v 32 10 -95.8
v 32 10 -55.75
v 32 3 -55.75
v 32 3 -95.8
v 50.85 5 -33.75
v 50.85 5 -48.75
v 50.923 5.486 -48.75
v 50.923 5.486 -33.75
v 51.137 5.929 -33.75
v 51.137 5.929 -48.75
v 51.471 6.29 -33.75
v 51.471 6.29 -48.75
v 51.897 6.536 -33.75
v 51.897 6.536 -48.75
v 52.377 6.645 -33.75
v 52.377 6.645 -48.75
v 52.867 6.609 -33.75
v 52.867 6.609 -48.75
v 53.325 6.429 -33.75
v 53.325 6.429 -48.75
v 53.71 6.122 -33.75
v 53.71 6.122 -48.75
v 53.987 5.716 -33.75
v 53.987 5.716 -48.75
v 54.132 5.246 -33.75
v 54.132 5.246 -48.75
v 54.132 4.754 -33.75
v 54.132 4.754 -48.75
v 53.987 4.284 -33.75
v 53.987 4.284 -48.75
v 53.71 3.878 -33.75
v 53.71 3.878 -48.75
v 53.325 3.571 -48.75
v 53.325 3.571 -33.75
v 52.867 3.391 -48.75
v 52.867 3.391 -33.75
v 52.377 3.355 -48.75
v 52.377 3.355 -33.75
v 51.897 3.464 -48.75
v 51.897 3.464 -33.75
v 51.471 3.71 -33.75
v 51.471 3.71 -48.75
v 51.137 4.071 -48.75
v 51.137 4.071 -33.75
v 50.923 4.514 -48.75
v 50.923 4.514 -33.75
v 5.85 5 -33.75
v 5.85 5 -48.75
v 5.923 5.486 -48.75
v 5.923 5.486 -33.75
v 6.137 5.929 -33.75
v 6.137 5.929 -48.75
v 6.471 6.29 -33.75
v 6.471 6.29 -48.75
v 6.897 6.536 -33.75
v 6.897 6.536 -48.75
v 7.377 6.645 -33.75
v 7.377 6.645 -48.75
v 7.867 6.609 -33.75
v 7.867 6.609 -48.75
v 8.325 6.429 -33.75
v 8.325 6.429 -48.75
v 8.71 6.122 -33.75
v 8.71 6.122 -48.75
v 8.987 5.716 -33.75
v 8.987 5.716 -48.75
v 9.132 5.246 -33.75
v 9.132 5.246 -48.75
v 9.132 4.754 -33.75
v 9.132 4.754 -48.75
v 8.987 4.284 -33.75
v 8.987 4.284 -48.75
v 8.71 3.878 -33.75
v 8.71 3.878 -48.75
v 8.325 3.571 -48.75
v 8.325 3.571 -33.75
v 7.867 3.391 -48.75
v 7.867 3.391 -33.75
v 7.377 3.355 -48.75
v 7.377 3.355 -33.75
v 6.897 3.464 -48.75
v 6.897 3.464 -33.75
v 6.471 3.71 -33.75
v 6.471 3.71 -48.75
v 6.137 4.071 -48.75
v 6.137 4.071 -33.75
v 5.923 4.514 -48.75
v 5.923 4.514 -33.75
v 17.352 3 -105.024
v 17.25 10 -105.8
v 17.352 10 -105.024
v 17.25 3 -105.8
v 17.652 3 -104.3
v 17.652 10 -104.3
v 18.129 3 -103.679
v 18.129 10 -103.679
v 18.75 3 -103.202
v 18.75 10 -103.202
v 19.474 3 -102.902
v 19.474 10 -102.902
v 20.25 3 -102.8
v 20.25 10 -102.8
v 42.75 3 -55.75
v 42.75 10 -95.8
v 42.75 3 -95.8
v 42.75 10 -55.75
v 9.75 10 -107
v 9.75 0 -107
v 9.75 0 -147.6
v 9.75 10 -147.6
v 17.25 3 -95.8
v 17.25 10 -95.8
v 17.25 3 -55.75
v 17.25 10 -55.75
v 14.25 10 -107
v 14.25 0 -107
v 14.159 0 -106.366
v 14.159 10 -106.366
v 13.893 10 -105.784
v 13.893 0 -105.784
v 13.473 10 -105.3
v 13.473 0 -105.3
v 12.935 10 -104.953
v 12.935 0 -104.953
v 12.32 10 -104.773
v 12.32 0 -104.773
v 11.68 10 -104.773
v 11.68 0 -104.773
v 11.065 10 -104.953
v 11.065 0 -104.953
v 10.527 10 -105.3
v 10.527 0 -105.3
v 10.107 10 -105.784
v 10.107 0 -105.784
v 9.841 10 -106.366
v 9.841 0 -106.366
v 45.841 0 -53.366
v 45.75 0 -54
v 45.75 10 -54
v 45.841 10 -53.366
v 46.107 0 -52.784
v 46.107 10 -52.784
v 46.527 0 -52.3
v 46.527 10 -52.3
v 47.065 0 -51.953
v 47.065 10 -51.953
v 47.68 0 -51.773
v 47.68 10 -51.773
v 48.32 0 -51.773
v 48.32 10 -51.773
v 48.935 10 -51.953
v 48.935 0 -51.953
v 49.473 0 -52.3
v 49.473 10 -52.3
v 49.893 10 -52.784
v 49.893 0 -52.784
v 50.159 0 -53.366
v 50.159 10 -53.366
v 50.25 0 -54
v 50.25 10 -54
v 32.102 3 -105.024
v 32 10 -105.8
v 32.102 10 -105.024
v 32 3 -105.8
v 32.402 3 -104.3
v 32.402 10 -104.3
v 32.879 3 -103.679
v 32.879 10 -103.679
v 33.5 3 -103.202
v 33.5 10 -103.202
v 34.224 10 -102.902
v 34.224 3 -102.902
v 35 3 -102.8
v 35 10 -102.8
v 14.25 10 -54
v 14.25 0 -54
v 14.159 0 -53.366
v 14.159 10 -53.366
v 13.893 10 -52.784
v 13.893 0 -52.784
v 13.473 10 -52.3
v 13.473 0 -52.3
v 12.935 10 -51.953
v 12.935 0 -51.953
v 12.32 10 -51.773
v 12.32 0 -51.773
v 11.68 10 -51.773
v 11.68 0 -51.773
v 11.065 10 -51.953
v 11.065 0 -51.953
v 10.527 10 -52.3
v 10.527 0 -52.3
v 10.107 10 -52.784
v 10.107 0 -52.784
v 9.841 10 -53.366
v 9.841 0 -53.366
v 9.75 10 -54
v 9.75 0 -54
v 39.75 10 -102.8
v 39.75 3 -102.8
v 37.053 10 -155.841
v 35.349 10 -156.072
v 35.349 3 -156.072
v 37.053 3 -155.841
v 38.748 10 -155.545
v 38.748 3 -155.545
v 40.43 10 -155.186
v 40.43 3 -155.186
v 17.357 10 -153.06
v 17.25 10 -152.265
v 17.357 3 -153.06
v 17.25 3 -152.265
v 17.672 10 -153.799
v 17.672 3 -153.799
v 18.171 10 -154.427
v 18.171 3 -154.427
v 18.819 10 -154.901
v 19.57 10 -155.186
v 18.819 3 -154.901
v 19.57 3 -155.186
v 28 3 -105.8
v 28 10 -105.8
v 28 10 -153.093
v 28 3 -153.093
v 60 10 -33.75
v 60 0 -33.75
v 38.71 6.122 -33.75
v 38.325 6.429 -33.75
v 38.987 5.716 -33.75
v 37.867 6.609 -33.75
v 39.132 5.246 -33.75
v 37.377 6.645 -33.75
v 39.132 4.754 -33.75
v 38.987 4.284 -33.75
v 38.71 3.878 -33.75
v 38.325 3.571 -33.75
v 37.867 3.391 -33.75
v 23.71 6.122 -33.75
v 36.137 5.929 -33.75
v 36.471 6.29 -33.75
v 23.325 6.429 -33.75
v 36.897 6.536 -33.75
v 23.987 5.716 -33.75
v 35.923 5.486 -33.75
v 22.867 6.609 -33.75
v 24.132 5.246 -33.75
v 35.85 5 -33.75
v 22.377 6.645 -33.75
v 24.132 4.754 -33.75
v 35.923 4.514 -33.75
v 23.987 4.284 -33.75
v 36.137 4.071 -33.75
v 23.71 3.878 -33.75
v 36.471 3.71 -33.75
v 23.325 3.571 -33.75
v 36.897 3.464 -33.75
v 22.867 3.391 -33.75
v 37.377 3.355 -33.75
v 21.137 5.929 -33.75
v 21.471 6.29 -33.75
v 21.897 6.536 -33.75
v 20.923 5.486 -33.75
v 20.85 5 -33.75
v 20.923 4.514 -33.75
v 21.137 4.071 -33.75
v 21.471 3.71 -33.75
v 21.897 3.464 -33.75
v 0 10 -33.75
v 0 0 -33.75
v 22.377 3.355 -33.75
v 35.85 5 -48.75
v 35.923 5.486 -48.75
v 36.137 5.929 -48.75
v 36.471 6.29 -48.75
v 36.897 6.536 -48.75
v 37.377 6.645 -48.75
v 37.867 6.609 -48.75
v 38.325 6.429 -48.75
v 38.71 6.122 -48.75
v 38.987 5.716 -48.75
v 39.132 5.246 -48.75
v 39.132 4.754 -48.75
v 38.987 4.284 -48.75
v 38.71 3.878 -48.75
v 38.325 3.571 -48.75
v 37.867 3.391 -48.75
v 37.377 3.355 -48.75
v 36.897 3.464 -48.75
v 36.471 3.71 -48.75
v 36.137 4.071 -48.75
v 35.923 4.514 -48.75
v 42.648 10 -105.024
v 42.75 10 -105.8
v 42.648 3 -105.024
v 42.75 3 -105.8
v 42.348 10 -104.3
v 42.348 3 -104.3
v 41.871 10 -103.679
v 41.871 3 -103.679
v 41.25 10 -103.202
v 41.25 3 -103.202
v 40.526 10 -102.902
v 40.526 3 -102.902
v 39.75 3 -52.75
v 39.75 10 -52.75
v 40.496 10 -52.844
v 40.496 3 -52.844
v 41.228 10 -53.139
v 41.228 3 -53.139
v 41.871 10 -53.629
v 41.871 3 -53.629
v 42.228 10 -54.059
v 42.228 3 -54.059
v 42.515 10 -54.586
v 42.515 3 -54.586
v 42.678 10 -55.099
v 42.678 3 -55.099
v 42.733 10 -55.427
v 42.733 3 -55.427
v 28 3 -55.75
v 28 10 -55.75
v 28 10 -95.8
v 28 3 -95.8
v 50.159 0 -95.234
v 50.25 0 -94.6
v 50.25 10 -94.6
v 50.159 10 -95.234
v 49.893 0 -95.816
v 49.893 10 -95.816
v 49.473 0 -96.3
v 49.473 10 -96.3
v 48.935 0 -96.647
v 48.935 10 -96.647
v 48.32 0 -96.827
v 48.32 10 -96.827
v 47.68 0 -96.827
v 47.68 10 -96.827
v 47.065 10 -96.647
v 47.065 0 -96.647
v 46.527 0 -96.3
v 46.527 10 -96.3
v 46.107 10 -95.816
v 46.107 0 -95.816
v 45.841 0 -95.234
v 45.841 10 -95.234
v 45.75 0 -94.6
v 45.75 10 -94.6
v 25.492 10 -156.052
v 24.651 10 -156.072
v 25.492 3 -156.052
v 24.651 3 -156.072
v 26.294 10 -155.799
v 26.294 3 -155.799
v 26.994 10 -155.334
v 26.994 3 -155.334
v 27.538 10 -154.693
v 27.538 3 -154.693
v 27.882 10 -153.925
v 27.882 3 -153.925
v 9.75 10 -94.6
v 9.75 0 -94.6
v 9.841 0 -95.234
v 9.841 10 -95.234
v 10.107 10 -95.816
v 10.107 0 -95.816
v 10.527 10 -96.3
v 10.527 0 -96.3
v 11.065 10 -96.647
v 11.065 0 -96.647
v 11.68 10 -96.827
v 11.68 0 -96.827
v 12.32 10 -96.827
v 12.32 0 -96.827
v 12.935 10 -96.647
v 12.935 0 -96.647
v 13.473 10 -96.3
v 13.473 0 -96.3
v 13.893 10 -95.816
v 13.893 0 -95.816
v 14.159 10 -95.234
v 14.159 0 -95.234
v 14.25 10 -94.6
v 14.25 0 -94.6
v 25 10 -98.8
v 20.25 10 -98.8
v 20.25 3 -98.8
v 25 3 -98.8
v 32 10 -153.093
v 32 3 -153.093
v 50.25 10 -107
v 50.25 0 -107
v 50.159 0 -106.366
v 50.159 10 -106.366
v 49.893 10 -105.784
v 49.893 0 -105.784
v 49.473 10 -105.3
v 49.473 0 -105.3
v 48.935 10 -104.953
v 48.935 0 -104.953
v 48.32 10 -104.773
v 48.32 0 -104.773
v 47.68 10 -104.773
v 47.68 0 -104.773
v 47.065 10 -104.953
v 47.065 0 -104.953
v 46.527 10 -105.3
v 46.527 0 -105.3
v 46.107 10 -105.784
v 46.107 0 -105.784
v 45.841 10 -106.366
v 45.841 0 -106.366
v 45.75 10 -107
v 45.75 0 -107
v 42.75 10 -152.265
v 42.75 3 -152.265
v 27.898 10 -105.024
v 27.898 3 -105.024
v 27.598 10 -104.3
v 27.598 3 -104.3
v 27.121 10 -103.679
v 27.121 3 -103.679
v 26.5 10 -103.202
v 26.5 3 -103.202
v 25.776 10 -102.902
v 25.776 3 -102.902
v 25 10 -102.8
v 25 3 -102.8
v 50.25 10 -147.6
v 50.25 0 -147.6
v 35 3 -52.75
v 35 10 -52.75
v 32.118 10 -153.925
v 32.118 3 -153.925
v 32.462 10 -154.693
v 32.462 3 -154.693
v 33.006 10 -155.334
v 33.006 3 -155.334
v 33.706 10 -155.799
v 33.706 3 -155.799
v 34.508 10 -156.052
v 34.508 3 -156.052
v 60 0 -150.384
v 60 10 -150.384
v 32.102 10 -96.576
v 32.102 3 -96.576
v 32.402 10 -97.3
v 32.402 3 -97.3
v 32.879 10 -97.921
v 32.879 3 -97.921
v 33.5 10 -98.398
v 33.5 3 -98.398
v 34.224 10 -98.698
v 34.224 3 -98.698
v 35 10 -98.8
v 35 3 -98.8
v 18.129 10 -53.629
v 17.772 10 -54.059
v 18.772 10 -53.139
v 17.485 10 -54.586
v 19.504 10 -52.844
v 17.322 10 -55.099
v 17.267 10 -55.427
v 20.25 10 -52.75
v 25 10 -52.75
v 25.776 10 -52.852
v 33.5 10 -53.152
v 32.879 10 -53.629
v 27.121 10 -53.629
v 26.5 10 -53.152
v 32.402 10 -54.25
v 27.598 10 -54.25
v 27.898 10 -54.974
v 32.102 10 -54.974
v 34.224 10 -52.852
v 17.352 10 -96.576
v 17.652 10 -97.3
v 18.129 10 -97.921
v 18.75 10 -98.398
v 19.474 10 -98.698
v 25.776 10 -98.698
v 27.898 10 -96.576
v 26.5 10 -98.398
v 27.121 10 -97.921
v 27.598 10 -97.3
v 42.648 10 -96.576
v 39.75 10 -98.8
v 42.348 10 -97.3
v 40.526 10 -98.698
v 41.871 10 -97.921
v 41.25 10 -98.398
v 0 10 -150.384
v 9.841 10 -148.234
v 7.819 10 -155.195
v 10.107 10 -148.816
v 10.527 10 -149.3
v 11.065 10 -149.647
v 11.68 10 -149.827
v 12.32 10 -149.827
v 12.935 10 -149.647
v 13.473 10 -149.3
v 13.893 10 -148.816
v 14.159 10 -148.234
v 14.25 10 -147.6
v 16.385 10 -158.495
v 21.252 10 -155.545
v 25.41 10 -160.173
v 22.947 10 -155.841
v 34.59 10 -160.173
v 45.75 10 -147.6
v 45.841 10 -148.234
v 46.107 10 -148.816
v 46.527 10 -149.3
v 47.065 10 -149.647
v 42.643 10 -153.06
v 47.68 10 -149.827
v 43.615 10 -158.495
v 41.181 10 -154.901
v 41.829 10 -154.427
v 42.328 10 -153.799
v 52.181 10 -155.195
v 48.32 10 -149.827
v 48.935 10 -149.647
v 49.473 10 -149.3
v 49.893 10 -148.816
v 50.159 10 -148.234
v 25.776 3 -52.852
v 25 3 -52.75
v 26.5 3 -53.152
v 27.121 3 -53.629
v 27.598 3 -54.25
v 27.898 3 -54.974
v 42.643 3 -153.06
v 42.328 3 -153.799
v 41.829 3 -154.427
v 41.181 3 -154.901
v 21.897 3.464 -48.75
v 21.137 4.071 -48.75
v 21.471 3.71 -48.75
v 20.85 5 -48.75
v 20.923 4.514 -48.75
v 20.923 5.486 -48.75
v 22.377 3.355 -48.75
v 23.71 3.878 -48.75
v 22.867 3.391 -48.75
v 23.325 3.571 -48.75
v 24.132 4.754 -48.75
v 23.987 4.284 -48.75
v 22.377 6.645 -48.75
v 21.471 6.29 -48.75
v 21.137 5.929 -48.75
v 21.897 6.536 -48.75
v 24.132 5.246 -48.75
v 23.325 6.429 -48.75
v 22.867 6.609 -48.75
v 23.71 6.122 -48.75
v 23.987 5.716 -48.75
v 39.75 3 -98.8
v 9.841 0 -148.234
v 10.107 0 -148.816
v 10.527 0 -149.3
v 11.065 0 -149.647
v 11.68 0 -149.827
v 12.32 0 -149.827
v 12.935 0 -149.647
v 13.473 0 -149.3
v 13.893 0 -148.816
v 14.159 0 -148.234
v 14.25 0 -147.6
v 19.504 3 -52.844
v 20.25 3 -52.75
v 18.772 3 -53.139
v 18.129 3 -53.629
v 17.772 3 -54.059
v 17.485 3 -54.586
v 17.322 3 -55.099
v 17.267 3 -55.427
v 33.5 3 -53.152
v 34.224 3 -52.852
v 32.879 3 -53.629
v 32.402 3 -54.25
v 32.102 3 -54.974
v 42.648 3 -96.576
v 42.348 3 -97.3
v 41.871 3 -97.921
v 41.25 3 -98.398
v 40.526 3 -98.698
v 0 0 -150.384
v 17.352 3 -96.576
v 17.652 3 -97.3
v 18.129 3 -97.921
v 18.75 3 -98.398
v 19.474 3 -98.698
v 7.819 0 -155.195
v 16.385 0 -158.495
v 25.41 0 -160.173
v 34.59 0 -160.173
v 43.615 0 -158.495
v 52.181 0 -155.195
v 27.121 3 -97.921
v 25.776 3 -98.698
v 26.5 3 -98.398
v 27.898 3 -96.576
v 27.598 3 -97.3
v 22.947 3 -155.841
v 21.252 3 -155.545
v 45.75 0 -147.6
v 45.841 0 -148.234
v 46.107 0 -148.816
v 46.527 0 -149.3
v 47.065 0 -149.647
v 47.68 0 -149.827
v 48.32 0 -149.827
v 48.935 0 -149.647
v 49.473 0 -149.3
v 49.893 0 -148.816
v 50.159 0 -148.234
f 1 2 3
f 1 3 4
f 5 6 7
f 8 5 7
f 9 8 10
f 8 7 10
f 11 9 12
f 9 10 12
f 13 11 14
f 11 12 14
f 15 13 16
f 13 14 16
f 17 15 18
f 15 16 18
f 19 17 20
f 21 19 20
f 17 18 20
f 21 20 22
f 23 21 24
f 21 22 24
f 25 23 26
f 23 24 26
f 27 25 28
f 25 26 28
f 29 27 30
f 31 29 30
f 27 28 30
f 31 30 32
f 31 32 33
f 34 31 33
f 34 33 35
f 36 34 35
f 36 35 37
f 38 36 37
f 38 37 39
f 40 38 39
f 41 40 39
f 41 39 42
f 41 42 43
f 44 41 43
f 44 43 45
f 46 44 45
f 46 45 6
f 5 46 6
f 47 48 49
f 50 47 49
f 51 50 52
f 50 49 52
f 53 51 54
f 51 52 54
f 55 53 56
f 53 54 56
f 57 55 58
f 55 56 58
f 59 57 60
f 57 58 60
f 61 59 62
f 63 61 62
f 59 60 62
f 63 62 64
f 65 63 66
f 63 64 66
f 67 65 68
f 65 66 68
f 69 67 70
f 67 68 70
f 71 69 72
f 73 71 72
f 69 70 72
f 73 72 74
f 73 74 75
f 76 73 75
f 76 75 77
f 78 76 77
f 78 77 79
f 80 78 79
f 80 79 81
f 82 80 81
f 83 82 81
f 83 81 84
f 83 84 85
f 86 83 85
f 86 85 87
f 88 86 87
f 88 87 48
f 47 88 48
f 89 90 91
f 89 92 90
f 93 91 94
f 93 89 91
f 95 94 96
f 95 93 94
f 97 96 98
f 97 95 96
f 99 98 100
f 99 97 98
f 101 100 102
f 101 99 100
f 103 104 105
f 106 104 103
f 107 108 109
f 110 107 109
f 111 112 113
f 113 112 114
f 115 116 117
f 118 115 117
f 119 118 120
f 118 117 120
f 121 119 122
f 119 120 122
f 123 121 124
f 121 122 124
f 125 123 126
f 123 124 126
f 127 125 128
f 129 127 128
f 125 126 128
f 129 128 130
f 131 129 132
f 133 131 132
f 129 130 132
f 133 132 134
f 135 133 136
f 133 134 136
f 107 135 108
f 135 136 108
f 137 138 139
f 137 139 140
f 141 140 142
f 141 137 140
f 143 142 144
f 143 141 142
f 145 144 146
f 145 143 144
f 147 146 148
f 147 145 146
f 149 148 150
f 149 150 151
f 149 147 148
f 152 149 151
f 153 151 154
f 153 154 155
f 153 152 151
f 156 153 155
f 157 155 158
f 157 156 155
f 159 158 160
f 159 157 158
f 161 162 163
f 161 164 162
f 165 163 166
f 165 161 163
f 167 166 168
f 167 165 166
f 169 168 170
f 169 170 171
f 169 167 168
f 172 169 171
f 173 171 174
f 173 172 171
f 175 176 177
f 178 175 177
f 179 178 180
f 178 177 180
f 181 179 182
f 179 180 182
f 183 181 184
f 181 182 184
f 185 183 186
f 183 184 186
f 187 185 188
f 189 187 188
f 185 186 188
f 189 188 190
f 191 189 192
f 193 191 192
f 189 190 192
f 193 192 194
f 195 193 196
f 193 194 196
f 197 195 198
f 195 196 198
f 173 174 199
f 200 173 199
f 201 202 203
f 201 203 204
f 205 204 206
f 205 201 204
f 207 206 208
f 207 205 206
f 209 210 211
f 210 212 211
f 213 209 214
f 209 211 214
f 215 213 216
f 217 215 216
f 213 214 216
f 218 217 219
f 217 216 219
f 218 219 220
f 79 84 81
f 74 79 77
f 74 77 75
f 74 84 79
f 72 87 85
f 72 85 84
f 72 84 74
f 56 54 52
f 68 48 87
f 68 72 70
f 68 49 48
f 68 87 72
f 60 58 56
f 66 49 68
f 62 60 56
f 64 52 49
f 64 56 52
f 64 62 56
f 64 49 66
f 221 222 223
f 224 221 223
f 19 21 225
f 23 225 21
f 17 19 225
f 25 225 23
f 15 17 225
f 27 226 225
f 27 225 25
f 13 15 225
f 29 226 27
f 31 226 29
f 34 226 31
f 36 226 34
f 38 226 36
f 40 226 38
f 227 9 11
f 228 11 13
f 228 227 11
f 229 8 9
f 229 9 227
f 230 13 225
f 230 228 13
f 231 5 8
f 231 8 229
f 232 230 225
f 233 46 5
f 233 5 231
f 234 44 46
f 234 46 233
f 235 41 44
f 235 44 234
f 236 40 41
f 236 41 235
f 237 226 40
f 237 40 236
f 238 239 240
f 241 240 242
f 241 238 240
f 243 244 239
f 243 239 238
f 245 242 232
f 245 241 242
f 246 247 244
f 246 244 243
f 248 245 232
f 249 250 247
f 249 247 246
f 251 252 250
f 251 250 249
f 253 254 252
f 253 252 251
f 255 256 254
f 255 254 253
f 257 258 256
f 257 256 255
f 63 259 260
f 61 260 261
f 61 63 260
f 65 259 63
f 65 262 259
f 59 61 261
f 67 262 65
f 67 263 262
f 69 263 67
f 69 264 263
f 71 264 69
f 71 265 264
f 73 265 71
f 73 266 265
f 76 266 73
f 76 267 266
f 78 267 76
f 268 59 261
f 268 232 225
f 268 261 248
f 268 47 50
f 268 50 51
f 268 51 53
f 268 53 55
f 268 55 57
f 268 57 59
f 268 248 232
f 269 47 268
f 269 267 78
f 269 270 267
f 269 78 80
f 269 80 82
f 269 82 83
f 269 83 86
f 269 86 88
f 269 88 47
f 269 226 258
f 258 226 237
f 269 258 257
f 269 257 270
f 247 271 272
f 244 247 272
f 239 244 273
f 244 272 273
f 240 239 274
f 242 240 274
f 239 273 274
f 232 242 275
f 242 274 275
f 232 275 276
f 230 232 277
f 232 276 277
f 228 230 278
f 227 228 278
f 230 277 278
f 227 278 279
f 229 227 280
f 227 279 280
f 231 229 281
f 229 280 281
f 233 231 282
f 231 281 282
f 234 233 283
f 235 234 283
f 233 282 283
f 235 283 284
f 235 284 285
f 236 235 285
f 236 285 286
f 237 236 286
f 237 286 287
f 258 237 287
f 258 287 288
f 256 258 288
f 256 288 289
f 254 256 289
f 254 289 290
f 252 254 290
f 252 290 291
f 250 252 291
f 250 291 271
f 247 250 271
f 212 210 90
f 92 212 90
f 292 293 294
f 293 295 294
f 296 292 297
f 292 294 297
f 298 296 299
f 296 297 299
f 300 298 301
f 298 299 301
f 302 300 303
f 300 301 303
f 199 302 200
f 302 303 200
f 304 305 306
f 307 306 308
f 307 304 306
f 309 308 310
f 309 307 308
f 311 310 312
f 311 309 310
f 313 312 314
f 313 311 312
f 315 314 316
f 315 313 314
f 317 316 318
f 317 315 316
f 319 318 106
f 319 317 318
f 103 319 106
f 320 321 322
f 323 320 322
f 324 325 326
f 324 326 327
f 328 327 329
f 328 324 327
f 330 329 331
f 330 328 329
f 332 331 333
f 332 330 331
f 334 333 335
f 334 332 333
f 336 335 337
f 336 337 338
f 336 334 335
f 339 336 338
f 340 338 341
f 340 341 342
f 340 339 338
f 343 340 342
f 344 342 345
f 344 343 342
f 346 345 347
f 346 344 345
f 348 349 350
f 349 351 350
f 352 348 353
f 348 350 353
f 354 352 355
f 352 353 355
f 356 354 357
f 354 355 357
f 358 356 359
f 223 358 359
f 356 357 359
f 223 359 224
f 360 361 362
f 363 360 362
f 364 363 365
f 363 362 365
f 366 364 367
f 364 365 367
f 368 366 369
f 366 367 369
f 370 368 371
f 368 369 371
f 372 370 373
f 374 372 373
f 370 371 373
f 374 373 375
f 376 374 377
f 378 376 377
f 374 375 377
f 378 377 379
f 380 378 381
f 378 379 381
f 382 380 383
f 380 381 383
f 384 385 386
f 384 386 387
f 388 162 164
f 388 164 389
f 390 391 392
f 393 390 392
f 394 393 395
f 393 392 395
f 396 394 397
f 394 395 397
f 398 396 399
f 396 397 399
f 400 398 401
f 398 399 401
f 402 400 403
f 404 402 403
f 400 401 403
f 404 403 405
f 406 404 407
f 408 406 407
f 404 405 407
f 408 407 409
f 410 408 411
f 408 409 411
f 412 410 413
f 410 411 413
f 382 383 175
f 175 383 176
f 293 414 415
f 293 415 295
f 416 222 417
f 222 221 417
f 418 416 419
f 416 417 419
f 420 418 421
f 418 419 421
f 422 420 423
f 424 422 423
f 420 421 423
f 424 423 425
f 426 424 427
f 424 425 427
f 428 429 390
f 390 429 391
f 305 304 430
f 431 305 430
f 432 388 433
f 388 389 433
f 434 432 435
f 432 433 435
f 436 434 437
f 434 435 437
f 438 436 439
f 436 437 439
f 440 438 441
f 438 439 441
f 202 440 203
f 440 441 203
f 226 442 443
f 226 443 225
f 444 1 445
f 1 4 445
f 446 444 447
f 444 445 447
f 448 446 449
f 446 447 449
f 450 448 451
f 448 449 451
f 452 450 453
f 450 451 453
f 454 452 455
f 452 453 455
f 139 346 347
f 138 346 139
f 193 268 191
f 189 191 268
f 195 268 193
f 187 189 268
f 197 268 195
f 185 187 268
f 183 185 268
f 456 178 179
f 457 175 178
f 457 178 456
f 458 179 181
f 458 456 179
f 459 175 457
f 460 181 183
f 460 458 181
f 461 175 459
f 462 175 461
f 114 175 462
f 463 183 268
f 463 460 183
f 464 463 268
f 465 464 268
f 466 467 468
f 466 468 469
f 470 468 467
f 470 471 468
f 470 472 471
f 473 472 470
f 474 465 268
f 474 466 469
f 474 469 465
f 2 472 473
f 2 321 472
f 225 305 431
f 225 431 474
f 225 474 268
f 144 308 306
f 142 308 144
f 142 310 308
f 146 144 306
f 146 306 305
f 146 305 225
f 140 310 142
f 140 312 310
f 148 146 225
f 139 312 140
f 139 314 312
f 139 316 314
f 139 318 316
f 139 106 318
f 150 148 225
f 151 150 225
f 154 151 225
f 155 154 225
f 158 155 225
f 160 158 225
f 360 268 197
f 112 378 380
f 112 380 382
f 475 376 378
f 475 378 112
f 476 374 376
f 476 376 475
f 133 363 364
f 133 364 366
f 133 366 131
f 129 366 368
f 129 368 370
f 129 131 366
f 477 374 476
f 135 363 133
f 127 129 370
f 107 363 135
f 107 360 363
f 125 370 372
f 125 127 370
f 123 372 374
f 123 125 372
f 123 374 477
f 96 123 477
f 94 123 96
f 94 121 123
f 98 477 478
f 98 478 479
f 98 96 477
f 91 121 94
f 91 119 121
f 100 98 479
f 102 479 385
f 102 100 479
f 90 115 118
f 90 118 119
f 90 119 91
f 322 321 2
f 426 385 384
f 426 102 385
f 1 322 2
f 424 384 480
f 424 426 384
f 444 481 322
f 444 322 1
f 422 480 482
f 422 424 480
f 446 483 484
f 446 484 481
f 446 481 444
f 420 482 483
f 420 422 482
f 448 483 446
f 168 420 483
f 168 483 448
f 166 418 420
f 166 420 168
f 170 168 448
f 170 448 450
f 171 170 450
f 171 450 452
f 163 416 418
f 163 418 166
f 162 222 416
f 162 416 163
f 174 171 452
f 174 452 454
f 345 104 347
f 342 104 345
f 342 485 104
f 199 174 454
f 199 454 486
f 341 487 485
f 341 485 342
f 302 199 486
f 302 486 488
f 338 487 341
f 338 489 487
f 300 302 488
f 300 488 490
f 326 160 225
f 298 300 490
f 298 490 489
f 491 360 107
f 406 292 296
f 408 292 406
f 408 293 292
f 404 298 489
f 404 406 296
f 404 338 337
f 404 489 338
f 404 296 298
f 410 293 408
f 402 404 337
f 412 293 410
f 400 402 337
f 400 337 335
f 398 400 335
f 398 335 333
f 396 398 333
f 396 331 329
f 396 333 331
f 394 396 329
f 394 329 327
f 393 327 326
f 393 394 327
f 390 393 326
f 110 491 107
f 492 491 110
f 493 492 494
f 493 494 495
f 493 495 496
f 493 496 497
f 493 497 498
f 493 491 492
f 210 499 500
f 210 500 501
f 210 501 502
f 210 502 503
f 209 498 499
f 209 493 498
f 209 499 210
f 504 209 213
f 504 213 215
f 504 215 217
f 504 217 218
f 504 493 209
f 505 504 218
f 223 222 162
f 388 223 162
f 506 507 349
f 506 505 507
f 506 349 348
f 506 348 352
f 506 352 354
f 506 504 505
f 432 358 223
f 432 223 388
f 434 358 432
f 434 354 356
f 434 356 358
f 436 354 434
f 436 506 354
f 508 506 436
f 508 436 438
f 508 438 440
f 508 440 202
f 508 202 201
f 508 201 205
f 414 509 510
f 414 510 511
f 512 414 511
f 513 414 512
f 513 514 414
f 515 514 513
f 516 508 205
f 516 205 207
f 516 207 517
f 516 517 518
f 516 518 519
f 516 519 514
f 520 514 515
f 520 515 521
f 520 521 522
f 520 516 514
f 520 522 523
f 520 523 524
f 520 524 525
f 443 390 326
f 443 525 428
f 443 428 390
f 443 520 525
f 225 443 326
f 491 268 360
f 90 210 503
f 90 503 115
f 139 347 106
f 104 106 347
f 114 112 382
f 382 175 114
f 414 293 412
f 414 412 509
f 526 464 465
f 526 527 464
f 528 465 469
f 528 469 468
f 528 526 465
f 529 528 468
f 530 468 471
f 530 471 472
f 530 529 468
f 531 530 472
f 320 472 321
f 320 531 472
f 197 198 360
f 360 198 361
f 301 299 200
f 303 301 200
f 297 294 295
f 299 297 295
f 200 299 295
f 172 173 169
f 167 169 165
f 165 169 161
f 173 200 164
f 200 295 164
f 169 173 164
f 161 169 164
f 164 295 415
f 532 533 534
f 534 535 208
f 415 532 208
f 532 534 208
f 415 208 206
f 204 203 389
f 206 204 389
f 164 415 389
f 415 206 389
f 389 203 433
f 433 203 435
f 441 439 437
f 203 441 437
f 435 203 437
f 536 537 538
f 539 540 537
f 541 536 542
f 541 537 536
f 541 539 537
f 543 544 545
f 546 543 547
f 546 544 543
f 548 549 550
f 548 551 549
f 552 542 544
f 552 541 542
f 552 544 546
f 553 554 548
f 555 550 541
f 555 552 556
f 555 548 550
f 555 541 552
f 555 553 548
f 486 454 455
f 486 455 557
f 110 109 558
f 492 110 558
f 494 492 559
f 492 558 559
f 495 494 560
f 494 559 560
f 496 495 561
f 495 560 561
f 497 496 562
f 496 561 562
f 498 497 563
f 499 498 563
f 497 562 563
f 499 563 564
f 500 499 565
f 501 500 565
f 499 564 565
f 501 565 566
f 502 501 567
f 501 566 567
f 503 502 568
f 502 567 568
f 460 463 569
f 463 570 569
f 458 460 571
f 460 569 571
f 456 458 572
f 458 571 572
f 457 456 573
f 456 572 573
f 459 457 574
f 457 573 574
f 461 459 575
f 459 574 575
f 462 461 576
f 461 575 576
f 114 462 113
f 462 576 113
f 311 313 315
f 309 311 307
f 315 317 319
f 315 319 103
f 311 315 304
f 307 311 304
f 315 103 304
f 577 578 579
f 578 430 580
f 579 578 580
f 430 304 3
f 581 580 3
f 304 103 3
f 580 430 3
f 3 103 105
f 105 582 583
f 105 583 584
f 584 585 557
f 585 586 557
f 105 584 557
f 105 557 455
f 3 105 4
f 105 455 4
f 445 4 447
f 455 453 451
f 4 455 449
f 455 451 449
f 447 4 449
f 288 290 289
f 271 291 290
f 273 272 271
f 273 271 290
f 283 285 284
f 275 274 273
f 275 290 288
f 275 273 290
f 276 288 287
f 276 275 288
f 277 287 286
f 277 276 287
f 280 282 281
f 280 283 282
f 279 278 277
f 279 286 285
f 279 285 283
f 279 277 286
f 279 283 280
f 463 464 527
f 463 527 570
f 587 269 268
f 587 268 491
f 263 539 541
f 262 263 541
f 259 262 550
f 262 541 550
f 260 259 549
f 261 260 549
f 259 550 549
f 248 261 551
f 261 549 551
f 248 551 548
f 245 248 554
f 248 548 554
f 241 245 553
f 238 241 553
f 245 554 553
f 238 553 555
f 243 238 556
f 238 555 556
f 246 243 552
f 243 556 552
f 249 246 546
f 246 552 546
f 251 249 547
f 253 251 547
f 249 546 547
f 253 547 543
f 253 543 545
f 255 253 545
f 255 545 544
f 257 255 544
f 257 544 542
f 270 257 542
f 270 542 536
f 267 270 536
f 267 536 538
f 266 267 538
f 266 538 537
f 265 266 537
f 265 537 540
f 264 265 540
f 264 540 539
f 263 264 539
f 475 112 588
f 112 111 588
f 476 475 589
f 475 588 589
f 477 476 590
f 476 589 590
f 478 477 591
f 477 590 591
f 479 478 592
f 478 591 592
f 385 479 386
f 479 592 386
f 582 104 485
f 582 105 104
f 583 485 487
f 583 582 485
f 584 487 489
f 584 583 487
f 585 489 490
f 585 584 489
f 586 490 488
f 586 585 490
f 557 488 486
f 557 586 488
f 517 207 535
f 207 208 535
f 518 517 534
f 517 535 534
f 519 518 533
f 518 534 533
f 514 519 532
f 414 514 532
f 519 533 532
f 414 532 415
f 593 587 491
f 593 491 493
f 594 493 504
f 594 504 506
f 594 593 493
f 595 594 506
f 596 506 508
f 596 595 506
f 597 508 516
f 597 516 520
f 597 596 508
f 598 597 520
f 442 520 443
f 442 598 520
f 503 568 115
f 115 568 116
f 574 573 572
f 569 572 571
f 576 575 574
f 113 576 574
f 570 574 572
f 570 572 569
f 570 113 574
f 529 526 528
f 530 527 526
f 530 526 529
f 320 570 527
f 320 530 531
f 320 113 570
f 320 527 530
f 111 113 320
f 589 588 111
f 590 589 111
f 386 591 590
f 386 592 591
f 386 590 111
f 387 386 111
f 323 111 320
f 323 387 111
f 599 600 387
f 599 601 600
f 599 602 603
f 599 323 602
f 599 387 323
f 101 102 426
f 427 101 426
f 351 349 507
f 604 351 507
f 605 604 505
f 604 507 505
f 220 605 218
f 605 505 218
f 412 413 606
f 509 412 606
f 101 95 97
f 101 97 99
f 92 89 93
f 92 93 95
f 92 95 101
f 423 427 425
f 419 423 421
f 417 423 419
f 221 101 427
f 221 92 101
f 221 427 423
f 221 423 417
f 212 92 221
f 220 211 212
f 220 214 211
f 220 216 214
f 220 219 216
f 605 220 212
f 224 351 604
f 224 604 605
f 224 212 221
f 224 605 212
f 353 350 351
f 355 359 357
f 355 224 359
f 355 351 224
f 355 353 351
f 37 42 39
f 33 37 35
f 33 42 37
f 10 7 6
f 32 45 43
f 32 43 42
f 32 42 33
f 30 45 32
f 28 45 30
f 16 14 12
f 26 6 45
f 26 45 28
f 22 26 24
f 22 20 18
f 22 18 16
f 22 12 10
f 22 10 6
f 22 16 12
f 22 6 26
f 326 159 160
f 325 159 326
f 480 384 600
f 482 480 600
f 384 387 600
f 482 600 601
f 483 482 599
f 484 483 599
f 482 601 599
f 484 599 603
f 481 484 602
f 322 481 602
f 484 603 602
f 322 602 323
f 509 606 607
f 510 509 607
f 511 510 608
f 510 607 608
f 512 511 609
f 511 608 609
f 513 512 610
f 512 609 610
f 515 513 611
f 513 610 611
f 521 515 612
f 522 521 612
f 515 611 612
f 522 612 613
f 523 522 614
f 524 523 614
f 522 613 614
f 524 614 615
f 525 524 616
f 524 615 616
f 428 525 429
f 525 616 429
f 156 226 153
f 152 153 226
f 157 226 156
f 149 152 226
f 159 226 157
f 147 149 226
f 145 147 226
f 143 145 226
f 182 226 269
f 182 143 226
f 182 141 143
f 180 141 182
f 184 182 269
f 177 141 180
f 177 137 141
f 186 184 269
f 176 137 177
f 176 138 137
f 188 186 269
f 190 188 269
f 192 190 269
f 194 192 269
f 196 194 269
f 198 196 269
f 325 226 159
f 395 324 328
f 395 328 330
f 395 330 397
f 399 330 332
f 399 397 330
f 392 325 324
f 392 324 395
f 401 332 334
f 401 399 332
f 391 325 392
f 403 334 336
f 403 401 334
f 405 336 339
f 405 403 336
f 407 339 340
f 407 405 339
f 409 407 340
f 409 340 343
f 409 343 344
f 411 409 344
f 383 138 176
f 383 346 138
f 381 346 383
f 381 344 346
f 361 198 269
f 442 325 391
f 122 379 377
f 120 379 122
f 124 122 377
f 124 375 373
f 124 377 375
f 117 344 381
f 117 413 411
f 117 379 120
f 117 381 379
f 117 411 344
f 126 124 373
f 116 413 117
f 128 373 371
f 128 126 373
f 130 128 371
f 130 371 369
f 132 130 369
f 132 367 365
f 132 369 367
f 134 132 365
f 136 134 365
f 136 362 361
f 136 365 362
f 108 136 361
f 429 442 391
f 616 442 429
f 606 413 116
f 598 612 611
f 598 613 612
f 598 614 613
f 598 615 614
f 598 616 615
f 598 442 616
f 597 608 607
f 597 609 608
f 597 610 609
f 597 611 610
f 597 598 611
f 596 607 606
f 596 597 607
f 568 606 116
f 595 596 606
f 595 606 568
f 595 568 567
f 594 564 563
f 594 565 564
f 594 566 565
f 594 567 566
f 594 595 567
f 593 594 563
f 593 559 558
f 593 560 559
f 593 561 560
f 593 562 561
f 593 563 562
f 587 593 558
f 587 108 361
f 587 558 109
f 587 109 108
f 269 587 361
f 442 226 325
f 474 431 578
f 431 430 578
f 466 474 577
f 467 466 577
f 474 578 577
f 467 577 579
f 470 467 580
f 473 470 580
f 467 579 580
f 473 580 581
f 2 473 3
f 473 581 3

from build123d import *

# Parameters (mm, degrees)
EXTRUDE_1_DEPTH     = 10
CUT_EXTRUDE_1_DEPTH = 7
EXTRUDE_2_REACH     = 173.532
SKETCH_3_W          = 10.75
SKETCH_3_H          = 4
FILLET_1_R          = 3
M4X0_71_D           = 3.3
M4X0_71_DEPTH       = 15
SKETCH_9_W          = 60
SKETCH_9_H          = 23.75
SKETCH_9_H_2        = 5
CUT_EXTRUDE_2_DEPTH = 10


with BuildPart() as part:
    # Эскиз1 → Бобышка-Вытянуть1 (new body)
    with BuildSketch(Plane(origin=(0, 0, 0), x_dir=(1, 0, 0), z_dir=(0, 1, 0))):
        with BuildLine():
            Line((0, 0), (0, 150.384470983))
            ThreePointArc((0, 150.384470983), (30, 160.384470983), (60, 150.384470983))
            Line((60, 150.384470983), (60, 0))
            Line((60, 0), (0, 0))
        make_face()
        with BuildLine():
            Line((14.25, 147.6), (14.25, 102))
            ThreePointArc((14.25, 102), (12, 99.75), (9.75, 102))
            Line((9.75, 102), (9.75, 147.6))
            ThreePointArc((9.75, 147.6), (12, 149.85), (14.25, 147.6))
        make_face(mode=Mode.SUBTRACT)
        with BuildLine():
            Line((50.25, 147.6), (50.25, 102))
            ThreePointArc((50.25, 102), (48, 99.75), (45.75, 102))
            Line((45.75, 102), (45.75, 147.6))
            ThreePointArc((45.75, 147.6), (48, 149.85), (50.25, 147.6))
        make_face(mode=Mode.SUBTRACT)
        with BuildLine():
            Line((14.25, 89.6), (14.25, 44))
            ThreePointArc((14.25, 44), (12, 41.75), (9.75, 44))
            Line((9.75, 44), (9.75, 89.6))
            ThreePointArc((9.75, 89.6), (12, 91.85), (14.25, 89.6))
        make_face(mode=Mode.SUBTRACT)
        with BuildLine():
            Line((45.75, 89.6), (45.75, 44))
            ThreePointArc((45.75, 44), (48, 41.75), (50.25, 44))
            Line((50.25, 44), (50.25, 89.6))
            ThreePointArc((50.25, 89.6), (48, 91.85), (45.75, 89.6))
        make_face(mode=Mode.SUBTRACT)
    extrude(amount=EXTRUDE_1_DEPTH)

    # Эскиз2 → Вырез-Вытянуть1 (cut)
    with BuildSketch(Plane(origin=(0, 10, 0), x_dir=(1, 0, 0), z_dir=(0, 1, 0))):
        with BuildLine():
            Line((4, 15), (28, 15))
            Line((28, 15), (28, 156.340972156))
            ThreePointArc((28, 156.340972156), (22.572755404, 155.780902976), (17.25, 154.5821802))
            Line((17.25, 154.5821802), (17.25, 44))
            ThreePointArc((17.25, 44), (15.712310601, 40.287689399), (12, 38.75))
            Line((12, 38.75), (4, 38.75))
            Line((4, 38.75), (4, 15))
        make_face()
        with BuildLine():
            Line((56, 15), (32, 15))
            Line((32, 15), (32, 156.340972156))
            ThreePointArc((32, 156.340972156), (37.427244596, 155.780902976), (42.75, 154.5821802))
            Line((42.75, 154.5821802), (42.75, 44))
            ThreePointArc((42.75, 44), (44.287689399, 40.287689399), (48, 38.75))
            Line((48, 38.75), (56, 38.75))
            Line((56, 38.75), (56, 15))
        make_face()
    extrude(amount=-CUT_EXTRUDE_1_DEPTH, mode=Mode.SUBTRACT)

    # Эскиз3 → Бобышка-Вытянуть2 (add, up to next)
    with BuildSketch(Plane(origin=(0, 10, 0), x_dir=(1, 0, 0), z_dir=(0, 1, 0)), mode=Mode.PRIVATE) as extrude_2_sk1:
        with BuildLine():
            ThreePointArc((17.099019514, 42.75), (15.240370349, 39.86932209), (12, 38.75))
            Line((12, 38.75), (28, 38.75))
            Line((28, 38.75), (28, 42.75))
            Line((28, 42.75), (17.099019514, 42.75))
        make_face()
    extrude_2_tool1 = extrude(extrude_2_sk1.sketch, amount=-EXTRUDE_2_REACH, mode=Mode.PRIVATE) - part.part
    # Эскиз3 → Бобышка-Вытянуть2 (add, up to next)
    with BuildSketch(Plane(origin=(0, 10, 0), x_dir=(1, 0, 0), z_dir=(0, 1, 0)), mode=Mode.PRIVATE) as extrude_2_sk2:
        with BuildLine():
            Line((32, 42.75), (32, 38.75))
            Line((32, 38.75), (48, 38.75))
            ThreePointArc((48, 38.75), (44.759629651, 39.86932209), (42.900980486, 42.75))
            Line((42.900980486, 42.75), (32, 42.75))
        make_face()
    extrude_2_tool2 = extrude(extrude_2_sk2.sketch, amount=-EXTRUDE_2_REACH, mode=Mode.PRIVATE) - part.part
    # Эскиз3 → Бобышка-Вытянуть2 (add, up to next)
    with BuildSketch(Plane(origin=(0, 10, 0), x_dir=(1, 0, 0), z_dir=(0, 1, 0)), mode=Mode.PRIVATE) as extrude_2_sk3:
        with Locations((22.625, 95.8)):
            Rectangle(SKETCH_3_W, SKETCH_3_H)
    extrude_2_tool3 = extrude(extrude_2_sk3.sketch, amount=-EXTRUDE_2_REACH, mode=Mode.PRIVATE) - part.part
    # Эскиз3 → Бобышка-Вытянуть2 (add, up to next)
    with BuildSketch(Plane(origin=(0, 10, 0), x_dir=(1, 0, 0), z_dir=(0, 1, 0)), mode=Mode.PRIVATE) as extrude_2_sk4:
        with Locations((37.375, 95.8)):
            Rectangle(SKETCH_3_W, SKETCH_3_H)
    extrude_2_tool4 = extrude(extrude_2_sk4.sketch, amount=-EXTRUDE_2_REACH, mode=Mode.PRIVATE) - part.part
    add(extrude_2_tool1.solids().sort_by_distance((21.839158, 10, -40.64687))[0])
    add(extrude_2_tool2.solids().sort_by_distance((38.160842, 10, -40.64687))[0])
    add(extrude_2_tool3.solids().sort_by_distance((22.625, 10, -95.8))[0])
    add(extrude_2_tool4.solids().sort_by_distance((37.375, 10, -95.8))[0])

    # Скругление1
    fillet_1_edges = [part.edges().sort_by_distance(p)[0] for p in [
        (32, 6.5, -38.75),
        (56, 6.5, -38.75),
        (56, 6.5, -15),
        (32, 6.5, -15),
        (4, 6.5, -15),
        (28, 6.5, -15),
        (28, 6.5, -38.75),
        (4, 6.5, -38.75),
        (17.25, 6.5, -93.8),
        (28, 6.5, -93.8),
        (17.099019514, 6.5, -42.75),
        (28, 6.5, -42.75),
        (32, 6.5, -42.75),
        (42.900980486, 6.5, -42.75),
        (42.75, 6.5, -93.8),
        (32, 6.5, -93.8),
        (32, 6.5, -156.340972156),
        (42.75, 6.5, -154.5821802),
        (42.75, 6.5, -97.8),
        (32, 6.5, -97.8),
        (17.25, 6.5, -97.8),
        (28, 6.5, -97.8),
        (17.25, 6.5, -154.5821802),
        (28, 6.5, -156.340972156),
    ]]
    fillet(fillet_1_edges, radius=FILLET_1_R)

    # Отверстие обработанное метчиком M4x0.71
    with Locations(Plane.XY):
        with Locations((7.5, 5), (22.5, 5), (37.5, 5), (52.5, 5)):
            Hole(M4X0_71_D / 2, depth=M4X0_71_DEPTH)

    # Эскиз9 → Вырез-Вытянуть2 (cut)
    with BuildSketch(Plane(origin=(0, 10, 0), x_dir=(1, 0, 0), z_dir=(0, 1, 0))):
        with Locations((30, 26.875)):
            Rectangle(SKETCH_9_W, SKETCH_9_H)
        with Locations((30, 74.766509245)):
            Rectangle(SKETCH_9_W, SKETCH_9_H_2)
        with Locations((30, 134.003959037)):
            Rectangle(SKETCH_9_W, SKETCH_9_H_2)
    extrude(amount=-CUT_EXTRUDE_2_DEPTH, mode=Mode.SUBTRACT)


with BuildPart() as cut_extrude_2_piece_1:
    # of the separate pieces the step leaves, piece 1, a body of its own (cut_extrude_2_pieces)
    add(part.part.solids().sort_by_distance((60, 10, -131.503959037))[0])


with BuildPart() as cut_extrude_2_piece_2:
    # of the separate pieces the step leaves, piece 2, a body of its own (cut_extrude_2_pieces)
    add(part.part.solids().sort_by_distance((60, 10, -72.266509245))[0])


with BuildPart() as cut_extrude_2_piece_3:
    # of the separate pieces the step leaves, piece 3, a body of its own (cut_extrude_2_pieces)
    add(part.part.solids().sort_by_distance((0, 10, 0))[0])


with BuildPart() as cut_extrude_2_piece_4:
    # of the separate pieces the step leaves, piece 4, a body of its own (cut_extrude_2_pieces)
    add(part.part.solids().sort_by_distance((60, 10, -150.384470983))[0])


with BuildPart() as cut_extrude_2_piece_1_1:
    # Move Body 1: read off the stored shape, not the designer's step
    # Move Body 1: moved
    add(cut_extrude_2_piece_1.part.moved(Location((0, 0, -5))))


with BuildPart() as cut_extrude_2_piece_2_1:
    # Move Body 2: read off the stored shape, not the designer's step
    # Move Body 2: moved
    add(cut_extrude_2_piece_2.part.moved(Location((0, 0, -10))))


with BuildPart() as cut_extrude_2_piece_3_1:
    # Move Body 3: read off the stored shape, not the designer's step
    # Move Body 3: moved
    add(cut_extrude_2_piece_3.part.moved(Location((0, 0, -33.75))))


with BuildPart() as cut_extrude_2_piece_4_1:
    add(cut_extrude_2_piece_4.part)

    # Combine 1: union Вырез-Вытянуть2 piece 1, Вырез-Вытянуть2 piece 2, Вырез-Вытянуть2 piece 3
    add(cut_extrude_2_piece_1_1.part)
    add(cut_extrude_2_piece_2_1.part)
    add(cut_extrude_2_piece_3_1.part)


solid = cut_extrude_2_piece_4_1.part
